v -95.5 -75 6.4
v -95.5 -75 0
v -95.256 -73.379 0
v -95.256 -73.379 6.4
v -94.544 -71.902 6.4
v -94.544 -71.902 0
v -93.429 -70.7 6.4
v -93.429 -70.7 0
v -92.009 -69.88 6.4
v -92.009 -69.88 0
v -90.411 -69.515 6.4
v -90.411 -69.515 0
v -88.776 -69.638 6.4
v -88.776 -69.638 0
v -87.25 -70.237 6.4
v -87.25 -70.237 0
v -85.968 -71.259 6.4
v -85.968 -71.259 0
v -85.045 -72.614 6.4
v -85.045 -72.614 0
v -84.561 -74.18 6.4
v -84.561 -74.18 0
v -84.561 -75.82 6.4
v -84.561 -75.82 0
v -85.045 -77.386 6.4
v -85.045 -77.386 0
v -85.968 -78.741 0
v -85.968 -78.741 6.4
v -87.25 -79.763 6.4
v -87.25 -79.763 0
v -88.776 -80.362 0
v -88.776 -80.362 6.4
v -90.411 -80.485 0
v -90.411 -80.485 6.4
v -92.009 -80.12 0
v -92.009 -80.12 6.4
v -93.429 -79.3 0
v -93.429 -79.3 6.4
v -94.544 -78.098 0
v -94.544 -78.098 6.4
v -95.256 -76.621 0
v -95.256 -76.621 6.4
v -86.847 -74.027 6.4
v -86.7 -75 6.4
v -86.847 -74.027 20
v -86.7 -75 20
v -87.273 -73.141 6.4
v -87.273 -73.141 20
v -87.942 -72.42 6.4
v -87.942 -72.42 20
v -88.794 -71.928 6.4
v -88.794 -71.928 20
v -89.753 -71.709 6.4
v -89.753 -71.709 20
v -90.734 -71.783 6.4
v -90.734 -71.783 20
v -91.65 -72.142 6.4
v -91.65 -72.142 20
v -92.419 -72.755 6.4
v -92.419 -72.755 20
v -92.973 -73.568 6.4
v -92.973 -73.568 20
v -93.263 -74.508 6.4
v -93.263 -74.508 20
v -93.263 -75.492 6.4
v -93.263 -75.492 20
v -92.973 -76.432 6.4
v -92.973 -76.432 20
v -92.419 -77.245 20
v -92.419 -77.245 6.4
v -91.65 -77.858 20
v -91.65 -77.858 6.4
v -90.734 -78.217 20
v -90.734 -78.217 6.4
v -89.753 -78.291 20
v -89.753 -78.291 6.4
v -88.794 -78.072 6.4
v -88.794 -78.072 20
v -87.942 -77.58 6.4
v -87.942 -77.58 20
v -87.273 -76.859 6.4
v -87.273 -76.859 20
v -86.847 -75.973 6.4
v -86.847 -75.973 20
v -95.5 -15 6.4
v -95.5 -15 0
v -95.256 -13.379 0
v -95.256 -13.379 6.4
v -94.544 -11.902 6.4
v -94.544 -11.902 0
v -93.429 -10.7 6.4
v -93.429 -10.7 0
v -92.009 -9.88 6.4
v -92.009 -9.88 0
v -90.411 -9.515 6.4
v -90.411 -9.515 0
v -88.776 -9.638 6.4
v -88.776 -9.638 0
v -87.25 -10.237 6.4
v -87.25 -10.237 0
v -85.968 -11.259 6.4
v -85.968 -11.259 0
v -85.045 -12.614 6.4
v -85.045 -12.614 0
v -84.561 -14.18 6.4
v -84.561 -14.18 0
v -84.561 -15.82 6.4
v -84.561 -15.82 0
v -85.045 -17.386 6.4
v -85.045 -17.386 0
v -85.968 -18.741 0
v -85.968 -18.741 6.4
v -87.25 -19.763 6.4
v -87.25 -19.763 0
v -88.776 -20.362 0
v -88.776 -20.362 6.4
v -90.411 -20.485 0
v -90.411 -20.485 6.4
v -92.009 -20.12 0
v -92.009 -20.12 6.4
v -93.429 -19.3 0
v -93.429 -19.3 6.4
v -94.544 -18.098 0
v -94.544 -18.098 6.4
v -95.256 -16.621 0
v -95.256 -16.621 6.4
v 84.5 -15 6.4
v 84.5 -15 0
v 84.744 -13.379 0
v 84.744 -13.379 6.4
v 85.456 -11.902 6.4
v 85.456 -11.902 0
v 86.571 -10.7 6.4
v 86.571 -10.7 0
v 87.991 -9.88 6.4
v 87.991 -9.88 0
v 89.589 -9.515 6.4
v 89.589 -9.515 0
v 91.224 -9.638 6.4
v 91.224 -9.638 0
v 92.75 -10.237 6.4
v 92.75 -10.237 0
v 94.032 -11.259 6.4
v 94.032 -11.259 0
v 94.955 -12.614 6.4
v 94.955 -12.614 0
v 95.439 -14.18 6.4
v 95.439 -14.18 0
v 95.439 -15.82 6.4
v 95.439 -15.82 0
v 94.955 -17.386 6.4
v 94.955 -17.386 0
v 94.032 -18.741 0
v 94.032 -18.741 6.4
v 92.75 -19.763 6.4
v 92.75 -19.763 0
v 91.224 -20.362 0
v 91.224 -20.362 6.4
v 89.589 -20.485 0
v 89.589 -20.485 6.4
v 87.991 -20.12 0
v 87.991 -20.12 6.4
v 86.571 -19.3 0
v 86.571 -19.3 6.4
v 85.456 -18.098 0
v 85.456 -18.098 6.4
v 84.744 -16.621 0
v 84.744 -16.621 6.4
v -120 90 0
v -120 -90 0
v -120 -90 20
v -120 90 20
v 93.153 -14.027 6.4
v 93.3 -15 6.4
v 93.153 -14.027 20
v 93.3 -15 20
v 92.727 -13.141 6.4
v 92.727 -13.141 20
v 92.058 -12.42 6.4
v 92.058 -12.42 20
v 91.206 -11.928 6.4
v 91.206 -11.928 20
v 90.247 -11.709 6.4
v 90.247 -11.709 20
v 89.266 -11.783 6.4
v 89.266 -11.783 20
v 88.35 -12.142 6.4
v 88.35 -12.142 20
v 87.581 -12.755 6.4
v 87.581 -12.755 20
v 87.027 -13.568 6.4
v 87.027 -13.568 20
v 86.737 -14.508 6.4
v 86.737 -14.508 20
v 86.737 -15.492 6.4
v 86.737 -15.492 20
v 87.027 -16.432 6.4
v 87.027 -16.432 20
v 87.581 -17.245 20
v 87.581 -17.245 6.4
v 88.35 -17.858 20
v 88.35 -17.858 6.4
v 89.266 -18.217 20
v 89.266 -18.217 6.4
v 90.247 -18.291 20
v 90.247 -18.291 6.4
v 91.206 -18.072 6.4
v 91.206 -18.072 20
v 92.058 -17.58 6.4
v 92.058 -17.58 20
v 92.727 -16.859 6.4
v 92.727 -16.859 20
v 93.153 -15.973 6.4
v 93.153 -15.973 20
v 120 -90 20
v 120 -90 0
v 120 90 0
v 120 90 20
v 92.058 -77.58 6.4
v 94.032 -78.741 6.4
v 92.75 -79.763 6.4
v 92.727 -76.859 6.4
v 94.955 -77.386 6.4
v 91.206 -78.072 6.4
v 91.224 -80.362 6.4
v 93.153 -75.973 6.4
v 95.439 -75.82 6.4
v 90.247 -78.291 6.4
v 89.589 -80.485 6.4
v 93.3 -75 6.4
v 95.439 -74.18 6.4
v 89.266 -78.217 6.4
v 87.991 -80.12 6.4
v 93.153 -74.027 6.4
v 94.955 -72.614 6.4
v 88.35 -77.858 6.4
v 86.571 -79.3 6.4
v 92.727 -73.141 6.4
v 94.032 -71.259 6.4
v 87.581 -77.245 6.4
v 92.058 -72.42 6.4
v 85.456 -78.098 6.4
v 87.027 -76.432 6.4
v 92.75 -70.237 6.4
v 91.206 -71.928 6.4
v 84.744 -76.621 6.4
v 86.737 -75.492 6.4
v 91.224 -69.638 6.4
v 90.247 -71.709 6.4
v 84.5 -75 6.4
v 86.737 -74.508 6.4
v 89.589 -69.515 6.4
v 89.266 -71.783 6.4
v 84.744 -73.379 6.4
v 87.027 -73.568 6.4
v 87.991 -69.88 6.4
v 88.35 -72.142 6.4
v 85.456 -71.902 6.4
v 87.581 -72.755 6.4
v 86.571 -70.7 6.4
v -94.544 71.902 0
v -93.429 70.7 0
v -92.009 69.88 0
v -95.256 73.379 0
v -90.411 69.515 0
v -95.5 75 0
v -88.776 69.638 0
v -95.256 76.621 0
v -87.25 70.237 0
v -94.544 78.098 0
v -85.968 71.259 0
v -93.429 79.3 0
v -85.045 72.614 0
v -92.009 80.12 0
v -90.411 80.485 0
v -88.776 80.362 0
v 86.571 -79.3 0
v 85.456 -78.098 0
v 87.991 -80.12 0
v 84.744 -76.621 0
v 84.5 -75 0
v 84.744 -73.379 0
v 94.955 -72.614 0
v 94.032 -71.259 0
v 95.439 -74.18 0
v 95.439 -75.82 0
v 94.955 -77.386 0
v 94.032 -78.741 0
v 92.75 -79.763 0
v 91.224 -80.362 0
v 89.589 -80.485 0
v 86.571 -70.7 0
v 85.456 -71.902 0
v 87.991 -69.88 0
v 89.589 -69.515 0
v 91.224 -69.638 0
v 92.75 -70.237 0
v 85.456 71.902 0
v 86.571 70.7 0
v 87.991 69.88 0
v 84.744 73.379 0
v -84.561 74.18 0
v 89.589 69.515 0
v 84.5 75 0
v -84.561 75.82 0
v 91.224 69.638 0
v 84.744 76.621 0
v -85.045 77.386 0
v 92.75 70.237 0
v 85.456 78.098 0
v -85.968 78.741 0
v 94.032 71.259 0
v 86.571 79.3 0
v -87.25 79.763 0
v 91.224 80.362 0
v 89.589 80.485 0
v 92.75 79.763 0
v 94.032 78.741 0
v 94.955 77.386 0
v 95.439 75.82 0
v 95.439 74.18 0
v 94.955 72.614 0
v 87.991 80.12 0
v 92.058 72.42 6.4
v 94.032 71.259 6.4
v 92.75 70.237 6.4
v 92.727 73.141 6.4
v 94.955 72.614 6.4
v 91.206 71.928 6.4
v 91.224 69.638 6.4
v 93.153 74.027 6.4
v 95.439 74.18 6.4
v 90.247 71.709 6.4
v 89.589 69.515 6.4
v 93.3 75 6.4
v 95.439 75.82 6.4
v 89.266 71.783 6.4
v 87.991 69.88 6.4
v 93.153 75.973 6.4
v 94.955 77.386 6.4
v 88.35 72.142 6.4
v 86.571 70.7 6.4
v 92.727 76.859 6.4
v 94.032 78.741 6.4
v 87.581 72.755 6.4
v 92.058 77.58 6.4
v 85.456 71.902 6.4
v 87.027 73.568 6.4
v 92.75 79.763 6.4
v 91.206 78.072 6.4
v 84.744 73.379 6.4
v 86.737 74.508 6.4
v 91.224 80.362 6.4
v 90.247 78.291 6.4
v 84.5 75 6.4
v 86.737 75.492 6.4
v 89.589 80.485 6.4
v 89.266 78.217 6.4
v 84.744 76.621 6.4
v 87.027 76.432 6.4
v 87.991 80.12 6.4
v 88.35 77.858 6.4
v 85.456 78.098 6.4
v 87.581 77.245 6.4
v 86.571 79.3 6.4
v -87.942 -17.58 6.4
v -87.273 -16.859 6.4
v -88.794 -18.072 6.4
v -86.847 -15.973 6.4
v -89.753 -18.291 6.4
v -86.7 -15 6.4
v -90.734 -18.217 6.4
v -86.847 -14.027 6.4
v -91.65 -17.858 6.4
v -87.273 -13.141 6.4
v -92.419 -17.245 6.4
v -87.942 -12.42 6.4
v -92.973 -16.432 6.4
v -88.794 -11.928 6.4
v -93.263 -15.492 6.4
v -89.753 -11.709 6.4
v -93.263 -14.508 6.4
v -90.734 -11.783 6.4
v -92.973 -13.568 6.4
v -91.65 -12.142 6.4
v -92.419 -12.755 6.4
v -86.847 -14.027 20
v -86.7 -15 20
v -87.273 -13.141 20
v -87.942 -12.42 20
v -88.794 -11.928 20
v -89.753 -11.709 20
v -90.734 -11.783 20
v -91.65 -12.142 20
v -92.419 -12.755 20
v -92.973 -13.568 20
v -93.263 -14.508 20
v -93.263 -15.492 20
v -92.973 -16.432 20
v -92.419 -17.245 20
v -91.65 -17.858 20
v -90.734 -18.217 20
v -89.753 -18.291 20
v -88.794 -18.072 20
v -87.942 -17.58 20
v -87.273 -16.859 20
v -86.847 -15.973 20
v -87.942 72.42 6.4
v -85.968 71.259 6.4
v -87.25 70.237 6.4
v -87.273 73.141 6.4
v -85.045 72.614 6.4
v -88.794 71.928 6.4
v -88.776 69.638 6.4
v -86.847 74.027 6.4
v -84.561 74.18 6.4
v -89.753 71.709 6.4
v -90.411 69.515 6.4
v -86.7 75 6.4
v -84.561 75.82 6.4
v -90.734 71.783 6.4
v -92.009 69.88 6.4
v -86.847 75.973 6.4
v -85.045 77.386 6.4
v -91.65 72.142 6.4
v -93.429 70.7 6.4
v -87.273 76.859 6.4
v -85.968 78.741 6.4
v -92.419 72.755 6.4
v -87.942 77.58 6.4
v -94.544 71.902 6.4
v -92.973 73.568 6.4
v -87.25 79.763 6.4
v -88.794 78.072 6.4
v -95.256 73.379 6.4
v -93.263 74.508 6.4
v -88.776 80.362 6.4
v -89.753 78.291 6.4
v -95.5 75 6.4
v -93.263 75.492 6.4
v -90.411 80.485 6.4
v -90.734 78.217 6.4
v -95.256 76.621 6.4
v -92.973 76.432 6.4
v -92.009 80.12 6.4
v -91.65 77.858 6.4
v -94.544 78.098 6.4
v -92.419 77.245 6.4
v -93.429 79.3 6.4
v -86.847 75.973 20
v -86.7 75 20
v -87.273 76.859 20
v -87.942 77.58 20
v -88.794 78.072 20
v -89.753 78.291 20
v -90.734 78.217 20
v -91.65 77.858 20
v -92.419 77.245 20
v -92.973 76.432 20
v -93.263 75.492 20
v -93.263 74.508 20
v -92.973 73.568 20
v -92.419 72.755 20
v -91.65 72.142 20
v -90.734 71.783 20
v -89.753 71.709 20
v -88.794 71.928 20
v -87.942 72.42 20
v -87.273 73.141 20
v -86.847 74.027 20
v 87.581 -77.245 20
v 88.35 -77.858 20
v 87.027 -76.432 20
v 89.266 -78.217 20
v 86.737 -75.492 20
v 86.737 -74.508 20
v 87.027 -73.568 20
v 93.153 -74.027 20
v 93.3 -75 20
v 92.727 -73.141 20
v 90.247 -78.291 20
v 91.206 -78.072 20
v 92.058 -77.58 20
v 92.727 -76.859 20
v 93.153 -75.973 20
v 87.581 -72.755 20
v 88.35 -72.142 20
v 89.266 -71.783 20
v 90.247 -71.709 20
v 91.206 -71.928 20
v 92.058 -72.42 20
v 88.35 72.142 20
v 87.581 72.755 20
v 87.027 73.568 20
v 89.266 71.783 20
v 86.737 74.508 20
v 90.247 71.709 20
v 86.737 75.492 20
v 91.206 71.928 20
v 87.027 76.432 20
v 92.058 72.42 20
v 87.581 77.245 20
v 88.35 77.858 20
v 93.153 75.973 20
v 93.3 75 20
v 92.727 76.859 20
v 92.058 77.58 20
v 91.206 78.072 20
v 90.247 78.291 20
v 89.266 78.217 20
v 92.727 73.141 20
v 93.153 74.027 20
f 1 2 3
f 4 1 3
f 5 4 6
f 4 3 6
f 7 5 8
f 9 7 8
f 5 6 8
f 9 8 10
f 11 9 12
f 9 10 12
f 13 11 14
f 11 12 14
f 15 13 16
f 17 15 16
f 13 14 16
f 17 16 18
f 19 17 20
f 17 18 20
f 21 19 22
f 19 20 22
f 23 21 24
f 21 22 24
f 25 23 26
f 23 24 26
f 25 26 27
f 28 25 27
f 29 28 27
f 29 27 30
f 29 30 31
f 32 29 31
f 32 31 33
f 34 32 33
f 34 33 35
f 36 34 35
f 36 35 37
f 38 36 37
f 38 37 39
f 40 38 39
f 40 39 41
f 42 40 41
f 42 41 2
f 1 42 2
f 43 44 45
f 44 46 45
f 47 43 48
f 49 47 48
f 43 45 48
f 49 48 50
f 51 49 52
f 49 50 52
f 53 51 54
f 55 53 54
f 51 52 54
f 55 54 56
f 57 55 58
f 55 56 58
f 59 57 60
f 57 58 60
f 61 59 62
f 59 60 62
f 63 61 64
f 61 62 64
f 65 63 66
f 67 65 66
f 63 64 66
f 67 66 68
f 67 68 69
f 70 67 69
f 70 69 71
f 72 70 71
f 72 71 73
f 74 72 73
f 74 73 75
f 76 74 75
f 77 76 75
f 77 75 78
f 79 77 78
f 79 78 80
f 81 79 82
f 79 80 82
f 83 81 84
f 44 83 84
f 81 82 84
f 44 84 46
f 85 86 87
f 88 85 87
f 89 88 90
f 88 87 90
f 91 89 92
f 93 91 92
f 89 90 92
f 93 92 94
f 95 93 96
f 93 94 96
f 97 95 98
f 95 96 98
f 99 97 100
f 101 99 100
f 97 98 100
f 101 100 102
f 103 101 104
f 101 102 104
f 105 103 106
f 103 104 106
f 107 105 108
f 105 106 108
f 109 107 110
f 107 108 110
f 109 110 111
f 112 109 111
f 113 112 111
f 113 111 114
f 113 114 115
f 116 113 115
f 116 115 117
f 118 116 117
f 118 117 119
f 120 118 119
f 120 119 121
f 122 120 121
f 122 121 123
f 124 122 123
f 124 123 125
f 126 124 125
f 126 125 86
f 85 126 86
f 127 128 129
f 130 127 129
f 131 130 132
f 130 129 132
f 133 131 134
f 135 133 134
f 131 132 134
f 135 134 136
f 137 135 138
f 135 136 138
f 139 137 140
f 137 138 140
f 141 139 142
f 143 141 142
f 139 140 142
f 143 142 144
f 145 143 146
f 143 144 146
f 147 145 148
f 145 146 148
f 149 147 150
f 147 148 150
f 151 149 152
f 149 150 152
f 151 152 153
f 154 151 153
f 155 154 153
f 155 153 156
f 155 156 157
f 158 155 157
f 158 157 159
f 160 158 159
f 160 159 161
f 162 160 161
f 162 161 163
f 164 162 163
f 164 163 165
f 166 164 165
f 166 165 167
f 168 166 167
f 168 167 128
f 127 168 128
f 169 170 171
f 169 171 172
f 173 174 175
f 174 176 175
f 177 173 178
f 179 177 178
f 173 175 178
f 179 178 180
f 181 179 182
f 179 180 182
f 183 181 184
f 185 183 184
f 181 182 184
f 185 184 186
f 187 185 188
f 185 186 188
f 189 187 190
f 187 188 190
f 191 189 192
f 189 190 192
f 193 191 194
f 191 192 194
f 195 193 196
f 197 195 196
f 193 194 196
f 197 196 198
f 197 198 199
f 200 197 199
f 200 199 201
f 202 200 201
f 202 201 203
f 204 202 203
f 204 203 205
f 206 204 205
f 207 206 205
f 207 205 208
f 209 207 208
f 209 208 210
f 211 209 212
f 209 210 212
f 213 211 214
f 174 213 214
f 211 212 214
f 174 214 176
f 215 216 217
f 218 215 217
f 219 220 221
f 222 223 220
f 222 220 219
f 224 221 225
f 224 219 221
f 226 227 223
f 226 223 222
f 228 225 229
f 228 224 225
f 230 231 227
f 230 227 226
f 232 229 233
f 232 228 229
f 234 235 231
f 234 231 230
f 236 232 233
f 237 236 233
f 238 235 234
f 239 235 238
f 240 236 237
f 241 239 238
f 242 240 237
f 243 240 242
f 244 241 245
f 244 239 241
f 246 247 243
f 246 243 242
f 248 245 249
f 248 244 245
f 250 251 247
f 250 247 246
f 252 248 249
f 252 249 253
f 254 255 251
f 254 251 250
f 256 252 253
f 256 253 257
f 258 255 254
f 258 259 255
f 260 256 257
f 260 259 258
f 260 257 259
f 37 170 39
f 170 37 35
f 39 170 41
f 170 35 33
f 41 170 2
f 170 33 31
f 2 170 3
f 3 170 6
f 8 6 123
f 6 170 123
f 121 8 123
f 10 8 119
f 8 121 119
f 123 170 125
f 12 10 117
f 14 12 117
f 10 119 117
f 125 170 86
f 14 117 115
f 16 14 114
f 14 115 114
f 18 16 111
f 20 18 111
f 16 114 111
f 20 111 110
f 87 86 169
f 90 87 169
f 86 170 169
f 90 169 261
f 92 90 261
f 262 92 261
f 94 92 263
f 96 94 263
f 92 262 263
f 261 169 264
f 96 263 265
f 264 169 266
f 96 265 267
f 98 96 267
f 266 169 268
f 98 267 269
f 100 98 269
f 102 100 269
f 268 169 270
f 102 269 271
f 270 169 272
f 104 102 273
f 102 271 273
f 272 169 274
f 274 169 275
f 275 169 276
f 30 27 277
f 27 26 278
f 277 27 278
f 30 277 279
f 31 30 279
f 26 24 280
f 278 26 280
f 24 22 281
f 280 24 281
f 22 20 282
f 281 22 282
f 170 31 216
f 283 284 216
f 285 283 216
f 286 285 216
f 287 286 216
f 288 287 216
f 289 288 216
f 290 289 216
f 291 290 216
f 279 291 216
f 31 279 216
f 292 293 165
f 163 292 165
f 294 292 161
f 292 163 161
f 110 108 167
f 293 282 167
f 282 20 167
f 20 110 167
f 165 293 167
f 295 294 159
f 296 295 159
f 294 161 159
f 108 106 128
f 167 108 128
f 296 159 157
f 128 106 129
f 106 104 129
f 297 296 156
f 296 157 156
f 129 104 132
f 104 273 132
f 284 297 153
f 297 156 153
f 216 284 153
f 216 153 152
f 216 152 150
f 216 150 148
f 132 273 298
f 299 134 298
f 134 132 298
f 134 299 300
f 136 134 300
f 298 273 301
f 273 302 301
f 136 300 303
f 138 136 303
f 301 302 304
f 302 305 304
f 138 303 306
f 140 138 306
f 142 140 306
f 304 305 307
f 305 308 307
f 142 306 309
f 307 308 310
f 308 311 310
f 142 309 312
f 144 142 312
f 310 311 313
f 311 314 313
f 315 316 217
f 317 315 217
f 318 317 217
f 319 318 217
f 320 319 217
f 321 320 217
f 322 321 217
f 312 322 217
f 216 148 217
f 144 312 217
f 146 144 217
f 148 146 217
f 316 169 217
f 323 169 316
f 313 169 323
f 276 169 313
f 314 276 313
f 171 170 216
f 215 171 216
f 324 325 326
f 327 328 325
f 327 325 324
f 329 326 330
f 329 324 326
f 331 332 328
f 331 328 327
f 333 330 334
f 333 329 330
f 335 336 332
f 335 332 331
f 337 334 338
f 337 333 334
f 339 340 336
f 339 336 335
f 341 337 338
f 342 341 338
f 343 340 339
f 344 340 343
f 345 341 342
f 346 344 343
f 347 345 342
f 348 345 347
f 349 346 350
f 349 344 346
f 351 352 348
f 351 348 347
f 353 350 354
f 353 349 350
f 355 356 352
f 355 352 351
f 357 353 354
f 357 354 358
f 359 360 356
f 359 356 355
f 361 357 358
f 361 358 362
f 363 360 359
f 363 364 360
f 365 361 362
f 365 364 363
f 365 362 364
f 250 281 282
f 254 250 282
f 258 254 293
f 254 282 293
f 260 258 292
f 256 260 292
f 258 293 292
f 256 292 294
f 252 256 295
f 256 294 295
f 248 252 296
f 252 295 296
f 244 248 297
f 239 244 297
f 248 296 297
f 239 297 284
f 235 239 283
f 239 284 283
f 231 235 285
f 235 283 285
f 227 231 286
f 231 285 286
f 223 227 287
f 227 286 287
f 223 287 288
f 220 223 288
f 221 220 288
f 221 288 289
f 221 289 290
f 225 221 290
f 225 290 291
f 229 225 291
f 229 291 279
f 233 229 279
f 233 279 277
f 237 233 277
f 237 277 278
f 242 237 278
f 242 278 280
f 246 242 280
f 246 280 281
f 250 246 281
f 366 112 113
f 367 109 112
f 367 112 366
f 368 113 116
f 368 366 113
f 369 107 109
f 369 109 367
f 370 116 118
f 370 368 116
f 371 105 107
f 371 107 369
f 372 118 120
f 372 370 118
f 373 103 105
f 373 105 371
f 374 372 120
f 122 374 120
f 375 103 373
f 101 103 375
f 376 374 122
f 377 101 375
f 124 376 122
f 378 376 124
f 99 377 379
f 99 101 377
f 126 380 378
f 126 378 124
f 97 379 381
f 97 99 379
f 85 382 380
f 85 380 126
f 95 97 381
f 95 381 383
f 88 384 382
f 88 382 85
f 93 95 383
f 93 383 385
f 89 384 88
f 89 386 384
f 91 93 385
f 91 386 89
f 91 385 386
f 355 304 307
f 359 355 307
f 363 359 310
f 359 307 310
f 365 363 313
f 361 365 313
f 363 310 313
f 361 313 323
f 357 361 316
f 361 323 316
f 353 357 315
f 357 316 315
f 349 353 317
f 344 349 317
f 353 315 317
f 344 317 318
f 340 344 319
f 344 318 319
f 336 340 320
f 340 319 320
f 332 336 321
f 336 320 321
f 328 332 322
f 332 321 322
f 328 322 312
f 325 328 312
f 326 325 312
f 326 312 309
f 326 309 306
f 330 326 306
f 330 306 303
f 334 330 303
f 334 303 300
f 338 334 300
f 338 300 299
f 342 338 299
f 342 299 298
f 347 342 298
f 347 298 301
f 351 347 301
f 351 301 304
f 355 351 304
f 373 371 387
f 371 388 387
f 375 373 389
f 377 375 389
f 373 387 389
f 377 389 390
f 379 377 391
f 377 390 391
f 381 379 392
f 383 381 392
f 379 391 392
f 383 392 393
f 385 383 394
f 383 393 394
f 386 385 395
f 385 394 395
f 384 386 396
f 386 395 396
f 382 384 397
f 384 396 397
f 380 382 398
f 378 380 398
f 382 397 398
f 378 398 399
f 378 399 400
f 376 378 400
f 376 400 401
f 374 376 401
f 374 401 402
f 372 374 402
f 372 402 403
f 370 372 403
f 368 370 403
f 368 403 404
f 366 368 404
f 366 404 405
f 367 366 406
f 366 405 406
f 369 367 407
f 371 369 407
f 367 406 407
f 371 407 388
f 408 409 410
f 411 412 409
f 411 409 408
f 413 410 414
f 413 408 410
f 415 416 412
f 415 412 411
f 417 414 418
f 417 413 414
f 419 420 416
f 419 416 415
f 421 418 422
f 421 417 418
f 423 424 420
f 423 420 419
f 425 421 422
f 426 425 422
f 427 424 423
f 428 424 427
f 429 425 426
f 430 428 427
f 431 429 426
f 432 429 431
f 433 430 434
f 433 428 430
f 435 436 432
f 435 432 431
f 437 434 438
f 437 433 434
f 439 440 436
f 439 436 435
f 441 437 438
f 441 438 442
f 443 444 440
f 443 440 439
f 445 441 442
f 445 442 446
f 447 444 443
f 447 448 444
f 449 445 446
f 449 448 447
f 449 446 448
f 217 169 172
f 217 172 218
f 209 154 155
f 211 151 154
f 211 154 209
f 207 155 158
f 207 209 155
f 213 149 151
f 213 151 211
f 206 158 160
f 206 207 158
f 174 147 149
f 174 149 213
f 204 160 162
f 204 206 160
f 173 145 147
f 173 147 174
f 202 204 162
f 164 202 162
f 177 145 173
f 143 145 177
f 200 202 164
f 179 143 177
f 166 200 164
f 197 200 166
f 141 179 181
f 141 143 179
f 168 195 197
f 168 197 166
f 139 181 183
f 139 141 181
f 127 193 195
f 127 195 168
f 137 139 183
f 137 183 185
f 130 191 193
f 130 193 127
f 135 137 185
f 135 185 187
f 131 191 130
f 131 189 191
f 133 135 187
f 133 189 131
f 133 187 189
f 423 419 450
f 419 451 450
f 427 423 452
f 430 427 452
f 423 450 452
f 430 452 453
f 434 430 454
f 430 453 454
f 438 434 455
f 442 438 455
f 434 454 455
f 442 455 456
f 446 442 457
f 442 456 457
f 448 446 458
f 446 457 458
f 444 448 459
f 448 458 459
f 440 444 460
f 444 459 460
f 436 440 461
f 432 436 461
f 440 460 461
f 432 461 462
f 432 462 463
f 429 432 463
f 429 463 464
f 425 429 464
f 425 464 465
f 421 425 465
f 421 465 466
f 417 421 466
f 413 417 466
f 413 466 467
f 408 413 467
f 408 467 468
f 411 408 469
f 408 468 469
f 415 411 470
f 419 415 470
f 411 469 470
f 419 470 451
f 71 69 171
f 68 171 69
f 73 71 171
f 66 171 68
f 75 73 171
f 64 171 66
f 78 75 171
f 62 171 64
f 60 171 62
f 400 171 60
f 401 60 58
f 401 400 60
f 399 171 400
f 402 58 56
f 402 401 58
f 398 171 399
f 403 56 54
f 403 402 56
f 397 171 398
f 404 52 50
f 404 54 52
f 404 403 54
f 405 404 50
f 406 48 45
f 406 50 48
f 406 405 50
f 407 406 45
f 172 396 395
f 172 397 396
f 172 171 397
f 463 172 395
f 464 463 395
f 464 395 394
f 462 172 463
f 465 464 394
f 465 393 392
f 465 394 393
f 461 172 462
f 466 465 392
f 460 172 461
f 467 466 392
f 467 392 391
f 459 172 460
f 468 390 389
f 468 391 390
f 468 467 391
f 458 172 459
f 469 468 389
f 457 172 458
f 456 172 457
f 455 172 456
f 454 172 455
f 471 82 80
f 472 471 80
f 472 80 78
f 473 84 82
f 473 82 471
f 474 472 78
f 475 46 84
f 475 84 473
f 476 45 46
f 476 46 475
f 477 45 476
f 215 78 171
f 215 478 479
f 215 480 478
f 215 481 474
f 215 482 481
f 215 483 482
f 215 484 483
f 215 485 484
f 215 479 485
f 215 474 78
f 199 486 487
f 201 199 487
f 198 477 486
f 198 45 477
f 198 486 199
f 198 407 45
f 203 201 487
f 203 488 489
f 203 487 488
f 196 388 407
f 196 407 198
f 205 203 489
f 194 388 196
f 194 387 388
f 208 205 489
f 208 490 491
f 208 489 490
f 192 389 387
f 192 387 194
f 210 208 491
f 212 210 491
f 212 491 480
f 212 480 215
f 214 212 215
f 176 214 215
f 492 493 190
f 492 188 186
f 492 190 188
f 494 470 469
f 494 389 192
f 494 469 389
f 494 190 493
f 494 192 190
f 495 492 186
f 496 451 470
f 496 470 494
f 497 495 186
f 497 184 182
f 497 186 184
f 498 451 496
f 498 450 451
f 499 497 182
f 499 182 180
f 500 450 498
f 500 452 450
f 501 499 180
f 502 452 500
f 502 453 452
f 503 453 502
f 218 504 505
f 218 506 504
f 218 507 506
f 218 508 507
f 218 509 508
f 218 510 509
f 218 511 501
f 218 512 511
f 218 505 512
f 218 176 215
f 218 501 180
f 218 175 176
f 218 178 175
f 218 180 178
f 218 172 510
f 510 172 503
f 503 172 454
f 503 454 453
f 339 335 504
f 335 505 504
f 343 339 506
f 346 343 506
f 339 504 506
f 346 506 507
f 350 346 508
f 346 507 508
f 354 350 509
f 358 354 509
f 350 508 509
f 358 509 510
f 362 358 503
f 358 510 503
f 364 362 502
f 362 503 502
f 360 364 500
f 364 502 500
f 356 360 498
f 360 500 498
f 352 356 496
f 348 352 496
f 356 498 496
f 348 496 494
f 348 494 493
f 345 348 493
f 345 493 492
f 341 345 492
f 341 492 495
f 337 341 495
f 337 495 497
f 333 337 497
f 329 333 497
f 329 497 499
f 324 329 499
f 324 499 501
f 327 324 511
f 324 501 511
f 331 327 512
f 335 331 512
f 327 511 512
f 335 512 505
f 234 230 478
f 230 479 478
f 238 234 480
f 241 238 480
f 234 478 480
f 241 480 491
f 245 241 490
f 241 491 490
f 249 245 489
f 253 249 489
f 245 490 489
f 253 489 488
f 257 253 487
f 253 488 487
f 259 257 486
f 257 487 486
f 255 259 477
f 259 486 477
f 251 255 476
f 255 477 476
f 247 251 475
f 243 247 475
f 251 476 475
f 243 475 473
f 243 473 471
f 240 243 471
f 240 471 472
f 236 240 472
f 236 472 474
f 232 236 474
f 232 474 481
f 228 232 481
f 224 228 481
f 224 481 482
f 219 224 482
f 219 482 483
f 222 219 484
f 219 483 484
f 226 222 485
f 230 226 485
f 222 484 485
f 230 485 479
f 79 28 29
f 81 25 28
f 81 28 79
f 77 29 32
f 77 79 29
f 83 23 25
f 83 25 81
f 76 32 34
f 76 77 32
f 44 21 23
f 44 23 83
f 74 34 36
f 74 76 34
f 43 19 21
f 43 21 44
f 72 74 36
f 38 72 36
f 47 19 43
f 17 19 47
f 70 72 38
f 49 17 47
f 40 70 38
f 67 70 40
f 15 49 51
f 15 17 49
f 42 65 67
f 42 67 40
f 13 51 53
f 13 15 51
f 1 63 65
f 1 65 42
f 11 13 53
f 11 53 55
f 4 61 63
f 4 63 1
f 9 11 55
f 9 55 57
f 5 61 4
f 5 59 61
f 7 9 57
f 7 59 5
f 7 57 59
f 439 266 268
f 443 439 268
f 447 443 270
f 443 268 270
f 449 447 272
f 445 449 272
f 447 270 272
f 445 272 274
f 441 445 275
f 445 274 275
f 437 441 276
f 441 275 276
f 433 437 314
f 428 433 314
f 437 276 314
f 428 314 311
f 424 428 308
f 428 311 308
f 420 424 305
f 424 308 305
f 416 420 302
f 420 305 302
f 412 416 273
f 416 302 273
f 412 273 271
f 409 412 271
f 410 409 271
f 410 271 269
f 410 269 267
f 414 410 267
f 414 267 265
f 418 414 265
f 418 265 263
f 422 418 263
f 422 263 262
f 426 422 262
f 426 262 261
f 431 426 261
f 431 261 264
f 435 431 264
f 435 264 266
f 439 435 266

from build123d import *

# Parameters (mm, degrees)
SKETCH1_W                                           = 240
SKETCH1_H                                           = 180
EXTRUDE1_DEPTH                                      = 20
CBORE_FOR_M6_HEX_SOCKET_HEAD_CAP_SCREW1_D           = 6.6
CBORE_FOR_M6_HEX_SOCKET_HEAD_CAP_SCREW1_CBORE_D     = 11
CBORE_FOR_M6_HEX_SOCKET_HEAD_CAP_SCREW1_CBORE_DEPTH = 6.4


with BuildPart() as part:
    # Sketch1 → Extrude1 (new body)
    with BuildSketch(Plane.XY):
        Rectangle(SKETCH1_W, SKETCH1_H)
    extrude(amount=EXTRUDE1_DEPTH)

    # CBORE for M6 Hex Socket Head Cap Screw1 (through all)
    with Locations(Plane(origin=(0, 0, 0), x_dir=(-1, 0, 0), z_dir=(0, 0, -1))):
        with Locations((-90, 75), (-90, -75), (-90, -15), (90, -15), (90, -75), (90, 75)):
            CounterBoreHole(CBORE_FOR_M6_HEX_SOCKET_HEAD_CAP_SCREW1_D / 2, CBORE_FOR_M6_HEX_SOCKET_HEAD_CAP_SCREW1_CBORE_D / 2, CBORE_FOR_M6_HEX_SOCKET_HEAD_CAP_SCREW1_CBORE_DEPTH)


solid = part.part
